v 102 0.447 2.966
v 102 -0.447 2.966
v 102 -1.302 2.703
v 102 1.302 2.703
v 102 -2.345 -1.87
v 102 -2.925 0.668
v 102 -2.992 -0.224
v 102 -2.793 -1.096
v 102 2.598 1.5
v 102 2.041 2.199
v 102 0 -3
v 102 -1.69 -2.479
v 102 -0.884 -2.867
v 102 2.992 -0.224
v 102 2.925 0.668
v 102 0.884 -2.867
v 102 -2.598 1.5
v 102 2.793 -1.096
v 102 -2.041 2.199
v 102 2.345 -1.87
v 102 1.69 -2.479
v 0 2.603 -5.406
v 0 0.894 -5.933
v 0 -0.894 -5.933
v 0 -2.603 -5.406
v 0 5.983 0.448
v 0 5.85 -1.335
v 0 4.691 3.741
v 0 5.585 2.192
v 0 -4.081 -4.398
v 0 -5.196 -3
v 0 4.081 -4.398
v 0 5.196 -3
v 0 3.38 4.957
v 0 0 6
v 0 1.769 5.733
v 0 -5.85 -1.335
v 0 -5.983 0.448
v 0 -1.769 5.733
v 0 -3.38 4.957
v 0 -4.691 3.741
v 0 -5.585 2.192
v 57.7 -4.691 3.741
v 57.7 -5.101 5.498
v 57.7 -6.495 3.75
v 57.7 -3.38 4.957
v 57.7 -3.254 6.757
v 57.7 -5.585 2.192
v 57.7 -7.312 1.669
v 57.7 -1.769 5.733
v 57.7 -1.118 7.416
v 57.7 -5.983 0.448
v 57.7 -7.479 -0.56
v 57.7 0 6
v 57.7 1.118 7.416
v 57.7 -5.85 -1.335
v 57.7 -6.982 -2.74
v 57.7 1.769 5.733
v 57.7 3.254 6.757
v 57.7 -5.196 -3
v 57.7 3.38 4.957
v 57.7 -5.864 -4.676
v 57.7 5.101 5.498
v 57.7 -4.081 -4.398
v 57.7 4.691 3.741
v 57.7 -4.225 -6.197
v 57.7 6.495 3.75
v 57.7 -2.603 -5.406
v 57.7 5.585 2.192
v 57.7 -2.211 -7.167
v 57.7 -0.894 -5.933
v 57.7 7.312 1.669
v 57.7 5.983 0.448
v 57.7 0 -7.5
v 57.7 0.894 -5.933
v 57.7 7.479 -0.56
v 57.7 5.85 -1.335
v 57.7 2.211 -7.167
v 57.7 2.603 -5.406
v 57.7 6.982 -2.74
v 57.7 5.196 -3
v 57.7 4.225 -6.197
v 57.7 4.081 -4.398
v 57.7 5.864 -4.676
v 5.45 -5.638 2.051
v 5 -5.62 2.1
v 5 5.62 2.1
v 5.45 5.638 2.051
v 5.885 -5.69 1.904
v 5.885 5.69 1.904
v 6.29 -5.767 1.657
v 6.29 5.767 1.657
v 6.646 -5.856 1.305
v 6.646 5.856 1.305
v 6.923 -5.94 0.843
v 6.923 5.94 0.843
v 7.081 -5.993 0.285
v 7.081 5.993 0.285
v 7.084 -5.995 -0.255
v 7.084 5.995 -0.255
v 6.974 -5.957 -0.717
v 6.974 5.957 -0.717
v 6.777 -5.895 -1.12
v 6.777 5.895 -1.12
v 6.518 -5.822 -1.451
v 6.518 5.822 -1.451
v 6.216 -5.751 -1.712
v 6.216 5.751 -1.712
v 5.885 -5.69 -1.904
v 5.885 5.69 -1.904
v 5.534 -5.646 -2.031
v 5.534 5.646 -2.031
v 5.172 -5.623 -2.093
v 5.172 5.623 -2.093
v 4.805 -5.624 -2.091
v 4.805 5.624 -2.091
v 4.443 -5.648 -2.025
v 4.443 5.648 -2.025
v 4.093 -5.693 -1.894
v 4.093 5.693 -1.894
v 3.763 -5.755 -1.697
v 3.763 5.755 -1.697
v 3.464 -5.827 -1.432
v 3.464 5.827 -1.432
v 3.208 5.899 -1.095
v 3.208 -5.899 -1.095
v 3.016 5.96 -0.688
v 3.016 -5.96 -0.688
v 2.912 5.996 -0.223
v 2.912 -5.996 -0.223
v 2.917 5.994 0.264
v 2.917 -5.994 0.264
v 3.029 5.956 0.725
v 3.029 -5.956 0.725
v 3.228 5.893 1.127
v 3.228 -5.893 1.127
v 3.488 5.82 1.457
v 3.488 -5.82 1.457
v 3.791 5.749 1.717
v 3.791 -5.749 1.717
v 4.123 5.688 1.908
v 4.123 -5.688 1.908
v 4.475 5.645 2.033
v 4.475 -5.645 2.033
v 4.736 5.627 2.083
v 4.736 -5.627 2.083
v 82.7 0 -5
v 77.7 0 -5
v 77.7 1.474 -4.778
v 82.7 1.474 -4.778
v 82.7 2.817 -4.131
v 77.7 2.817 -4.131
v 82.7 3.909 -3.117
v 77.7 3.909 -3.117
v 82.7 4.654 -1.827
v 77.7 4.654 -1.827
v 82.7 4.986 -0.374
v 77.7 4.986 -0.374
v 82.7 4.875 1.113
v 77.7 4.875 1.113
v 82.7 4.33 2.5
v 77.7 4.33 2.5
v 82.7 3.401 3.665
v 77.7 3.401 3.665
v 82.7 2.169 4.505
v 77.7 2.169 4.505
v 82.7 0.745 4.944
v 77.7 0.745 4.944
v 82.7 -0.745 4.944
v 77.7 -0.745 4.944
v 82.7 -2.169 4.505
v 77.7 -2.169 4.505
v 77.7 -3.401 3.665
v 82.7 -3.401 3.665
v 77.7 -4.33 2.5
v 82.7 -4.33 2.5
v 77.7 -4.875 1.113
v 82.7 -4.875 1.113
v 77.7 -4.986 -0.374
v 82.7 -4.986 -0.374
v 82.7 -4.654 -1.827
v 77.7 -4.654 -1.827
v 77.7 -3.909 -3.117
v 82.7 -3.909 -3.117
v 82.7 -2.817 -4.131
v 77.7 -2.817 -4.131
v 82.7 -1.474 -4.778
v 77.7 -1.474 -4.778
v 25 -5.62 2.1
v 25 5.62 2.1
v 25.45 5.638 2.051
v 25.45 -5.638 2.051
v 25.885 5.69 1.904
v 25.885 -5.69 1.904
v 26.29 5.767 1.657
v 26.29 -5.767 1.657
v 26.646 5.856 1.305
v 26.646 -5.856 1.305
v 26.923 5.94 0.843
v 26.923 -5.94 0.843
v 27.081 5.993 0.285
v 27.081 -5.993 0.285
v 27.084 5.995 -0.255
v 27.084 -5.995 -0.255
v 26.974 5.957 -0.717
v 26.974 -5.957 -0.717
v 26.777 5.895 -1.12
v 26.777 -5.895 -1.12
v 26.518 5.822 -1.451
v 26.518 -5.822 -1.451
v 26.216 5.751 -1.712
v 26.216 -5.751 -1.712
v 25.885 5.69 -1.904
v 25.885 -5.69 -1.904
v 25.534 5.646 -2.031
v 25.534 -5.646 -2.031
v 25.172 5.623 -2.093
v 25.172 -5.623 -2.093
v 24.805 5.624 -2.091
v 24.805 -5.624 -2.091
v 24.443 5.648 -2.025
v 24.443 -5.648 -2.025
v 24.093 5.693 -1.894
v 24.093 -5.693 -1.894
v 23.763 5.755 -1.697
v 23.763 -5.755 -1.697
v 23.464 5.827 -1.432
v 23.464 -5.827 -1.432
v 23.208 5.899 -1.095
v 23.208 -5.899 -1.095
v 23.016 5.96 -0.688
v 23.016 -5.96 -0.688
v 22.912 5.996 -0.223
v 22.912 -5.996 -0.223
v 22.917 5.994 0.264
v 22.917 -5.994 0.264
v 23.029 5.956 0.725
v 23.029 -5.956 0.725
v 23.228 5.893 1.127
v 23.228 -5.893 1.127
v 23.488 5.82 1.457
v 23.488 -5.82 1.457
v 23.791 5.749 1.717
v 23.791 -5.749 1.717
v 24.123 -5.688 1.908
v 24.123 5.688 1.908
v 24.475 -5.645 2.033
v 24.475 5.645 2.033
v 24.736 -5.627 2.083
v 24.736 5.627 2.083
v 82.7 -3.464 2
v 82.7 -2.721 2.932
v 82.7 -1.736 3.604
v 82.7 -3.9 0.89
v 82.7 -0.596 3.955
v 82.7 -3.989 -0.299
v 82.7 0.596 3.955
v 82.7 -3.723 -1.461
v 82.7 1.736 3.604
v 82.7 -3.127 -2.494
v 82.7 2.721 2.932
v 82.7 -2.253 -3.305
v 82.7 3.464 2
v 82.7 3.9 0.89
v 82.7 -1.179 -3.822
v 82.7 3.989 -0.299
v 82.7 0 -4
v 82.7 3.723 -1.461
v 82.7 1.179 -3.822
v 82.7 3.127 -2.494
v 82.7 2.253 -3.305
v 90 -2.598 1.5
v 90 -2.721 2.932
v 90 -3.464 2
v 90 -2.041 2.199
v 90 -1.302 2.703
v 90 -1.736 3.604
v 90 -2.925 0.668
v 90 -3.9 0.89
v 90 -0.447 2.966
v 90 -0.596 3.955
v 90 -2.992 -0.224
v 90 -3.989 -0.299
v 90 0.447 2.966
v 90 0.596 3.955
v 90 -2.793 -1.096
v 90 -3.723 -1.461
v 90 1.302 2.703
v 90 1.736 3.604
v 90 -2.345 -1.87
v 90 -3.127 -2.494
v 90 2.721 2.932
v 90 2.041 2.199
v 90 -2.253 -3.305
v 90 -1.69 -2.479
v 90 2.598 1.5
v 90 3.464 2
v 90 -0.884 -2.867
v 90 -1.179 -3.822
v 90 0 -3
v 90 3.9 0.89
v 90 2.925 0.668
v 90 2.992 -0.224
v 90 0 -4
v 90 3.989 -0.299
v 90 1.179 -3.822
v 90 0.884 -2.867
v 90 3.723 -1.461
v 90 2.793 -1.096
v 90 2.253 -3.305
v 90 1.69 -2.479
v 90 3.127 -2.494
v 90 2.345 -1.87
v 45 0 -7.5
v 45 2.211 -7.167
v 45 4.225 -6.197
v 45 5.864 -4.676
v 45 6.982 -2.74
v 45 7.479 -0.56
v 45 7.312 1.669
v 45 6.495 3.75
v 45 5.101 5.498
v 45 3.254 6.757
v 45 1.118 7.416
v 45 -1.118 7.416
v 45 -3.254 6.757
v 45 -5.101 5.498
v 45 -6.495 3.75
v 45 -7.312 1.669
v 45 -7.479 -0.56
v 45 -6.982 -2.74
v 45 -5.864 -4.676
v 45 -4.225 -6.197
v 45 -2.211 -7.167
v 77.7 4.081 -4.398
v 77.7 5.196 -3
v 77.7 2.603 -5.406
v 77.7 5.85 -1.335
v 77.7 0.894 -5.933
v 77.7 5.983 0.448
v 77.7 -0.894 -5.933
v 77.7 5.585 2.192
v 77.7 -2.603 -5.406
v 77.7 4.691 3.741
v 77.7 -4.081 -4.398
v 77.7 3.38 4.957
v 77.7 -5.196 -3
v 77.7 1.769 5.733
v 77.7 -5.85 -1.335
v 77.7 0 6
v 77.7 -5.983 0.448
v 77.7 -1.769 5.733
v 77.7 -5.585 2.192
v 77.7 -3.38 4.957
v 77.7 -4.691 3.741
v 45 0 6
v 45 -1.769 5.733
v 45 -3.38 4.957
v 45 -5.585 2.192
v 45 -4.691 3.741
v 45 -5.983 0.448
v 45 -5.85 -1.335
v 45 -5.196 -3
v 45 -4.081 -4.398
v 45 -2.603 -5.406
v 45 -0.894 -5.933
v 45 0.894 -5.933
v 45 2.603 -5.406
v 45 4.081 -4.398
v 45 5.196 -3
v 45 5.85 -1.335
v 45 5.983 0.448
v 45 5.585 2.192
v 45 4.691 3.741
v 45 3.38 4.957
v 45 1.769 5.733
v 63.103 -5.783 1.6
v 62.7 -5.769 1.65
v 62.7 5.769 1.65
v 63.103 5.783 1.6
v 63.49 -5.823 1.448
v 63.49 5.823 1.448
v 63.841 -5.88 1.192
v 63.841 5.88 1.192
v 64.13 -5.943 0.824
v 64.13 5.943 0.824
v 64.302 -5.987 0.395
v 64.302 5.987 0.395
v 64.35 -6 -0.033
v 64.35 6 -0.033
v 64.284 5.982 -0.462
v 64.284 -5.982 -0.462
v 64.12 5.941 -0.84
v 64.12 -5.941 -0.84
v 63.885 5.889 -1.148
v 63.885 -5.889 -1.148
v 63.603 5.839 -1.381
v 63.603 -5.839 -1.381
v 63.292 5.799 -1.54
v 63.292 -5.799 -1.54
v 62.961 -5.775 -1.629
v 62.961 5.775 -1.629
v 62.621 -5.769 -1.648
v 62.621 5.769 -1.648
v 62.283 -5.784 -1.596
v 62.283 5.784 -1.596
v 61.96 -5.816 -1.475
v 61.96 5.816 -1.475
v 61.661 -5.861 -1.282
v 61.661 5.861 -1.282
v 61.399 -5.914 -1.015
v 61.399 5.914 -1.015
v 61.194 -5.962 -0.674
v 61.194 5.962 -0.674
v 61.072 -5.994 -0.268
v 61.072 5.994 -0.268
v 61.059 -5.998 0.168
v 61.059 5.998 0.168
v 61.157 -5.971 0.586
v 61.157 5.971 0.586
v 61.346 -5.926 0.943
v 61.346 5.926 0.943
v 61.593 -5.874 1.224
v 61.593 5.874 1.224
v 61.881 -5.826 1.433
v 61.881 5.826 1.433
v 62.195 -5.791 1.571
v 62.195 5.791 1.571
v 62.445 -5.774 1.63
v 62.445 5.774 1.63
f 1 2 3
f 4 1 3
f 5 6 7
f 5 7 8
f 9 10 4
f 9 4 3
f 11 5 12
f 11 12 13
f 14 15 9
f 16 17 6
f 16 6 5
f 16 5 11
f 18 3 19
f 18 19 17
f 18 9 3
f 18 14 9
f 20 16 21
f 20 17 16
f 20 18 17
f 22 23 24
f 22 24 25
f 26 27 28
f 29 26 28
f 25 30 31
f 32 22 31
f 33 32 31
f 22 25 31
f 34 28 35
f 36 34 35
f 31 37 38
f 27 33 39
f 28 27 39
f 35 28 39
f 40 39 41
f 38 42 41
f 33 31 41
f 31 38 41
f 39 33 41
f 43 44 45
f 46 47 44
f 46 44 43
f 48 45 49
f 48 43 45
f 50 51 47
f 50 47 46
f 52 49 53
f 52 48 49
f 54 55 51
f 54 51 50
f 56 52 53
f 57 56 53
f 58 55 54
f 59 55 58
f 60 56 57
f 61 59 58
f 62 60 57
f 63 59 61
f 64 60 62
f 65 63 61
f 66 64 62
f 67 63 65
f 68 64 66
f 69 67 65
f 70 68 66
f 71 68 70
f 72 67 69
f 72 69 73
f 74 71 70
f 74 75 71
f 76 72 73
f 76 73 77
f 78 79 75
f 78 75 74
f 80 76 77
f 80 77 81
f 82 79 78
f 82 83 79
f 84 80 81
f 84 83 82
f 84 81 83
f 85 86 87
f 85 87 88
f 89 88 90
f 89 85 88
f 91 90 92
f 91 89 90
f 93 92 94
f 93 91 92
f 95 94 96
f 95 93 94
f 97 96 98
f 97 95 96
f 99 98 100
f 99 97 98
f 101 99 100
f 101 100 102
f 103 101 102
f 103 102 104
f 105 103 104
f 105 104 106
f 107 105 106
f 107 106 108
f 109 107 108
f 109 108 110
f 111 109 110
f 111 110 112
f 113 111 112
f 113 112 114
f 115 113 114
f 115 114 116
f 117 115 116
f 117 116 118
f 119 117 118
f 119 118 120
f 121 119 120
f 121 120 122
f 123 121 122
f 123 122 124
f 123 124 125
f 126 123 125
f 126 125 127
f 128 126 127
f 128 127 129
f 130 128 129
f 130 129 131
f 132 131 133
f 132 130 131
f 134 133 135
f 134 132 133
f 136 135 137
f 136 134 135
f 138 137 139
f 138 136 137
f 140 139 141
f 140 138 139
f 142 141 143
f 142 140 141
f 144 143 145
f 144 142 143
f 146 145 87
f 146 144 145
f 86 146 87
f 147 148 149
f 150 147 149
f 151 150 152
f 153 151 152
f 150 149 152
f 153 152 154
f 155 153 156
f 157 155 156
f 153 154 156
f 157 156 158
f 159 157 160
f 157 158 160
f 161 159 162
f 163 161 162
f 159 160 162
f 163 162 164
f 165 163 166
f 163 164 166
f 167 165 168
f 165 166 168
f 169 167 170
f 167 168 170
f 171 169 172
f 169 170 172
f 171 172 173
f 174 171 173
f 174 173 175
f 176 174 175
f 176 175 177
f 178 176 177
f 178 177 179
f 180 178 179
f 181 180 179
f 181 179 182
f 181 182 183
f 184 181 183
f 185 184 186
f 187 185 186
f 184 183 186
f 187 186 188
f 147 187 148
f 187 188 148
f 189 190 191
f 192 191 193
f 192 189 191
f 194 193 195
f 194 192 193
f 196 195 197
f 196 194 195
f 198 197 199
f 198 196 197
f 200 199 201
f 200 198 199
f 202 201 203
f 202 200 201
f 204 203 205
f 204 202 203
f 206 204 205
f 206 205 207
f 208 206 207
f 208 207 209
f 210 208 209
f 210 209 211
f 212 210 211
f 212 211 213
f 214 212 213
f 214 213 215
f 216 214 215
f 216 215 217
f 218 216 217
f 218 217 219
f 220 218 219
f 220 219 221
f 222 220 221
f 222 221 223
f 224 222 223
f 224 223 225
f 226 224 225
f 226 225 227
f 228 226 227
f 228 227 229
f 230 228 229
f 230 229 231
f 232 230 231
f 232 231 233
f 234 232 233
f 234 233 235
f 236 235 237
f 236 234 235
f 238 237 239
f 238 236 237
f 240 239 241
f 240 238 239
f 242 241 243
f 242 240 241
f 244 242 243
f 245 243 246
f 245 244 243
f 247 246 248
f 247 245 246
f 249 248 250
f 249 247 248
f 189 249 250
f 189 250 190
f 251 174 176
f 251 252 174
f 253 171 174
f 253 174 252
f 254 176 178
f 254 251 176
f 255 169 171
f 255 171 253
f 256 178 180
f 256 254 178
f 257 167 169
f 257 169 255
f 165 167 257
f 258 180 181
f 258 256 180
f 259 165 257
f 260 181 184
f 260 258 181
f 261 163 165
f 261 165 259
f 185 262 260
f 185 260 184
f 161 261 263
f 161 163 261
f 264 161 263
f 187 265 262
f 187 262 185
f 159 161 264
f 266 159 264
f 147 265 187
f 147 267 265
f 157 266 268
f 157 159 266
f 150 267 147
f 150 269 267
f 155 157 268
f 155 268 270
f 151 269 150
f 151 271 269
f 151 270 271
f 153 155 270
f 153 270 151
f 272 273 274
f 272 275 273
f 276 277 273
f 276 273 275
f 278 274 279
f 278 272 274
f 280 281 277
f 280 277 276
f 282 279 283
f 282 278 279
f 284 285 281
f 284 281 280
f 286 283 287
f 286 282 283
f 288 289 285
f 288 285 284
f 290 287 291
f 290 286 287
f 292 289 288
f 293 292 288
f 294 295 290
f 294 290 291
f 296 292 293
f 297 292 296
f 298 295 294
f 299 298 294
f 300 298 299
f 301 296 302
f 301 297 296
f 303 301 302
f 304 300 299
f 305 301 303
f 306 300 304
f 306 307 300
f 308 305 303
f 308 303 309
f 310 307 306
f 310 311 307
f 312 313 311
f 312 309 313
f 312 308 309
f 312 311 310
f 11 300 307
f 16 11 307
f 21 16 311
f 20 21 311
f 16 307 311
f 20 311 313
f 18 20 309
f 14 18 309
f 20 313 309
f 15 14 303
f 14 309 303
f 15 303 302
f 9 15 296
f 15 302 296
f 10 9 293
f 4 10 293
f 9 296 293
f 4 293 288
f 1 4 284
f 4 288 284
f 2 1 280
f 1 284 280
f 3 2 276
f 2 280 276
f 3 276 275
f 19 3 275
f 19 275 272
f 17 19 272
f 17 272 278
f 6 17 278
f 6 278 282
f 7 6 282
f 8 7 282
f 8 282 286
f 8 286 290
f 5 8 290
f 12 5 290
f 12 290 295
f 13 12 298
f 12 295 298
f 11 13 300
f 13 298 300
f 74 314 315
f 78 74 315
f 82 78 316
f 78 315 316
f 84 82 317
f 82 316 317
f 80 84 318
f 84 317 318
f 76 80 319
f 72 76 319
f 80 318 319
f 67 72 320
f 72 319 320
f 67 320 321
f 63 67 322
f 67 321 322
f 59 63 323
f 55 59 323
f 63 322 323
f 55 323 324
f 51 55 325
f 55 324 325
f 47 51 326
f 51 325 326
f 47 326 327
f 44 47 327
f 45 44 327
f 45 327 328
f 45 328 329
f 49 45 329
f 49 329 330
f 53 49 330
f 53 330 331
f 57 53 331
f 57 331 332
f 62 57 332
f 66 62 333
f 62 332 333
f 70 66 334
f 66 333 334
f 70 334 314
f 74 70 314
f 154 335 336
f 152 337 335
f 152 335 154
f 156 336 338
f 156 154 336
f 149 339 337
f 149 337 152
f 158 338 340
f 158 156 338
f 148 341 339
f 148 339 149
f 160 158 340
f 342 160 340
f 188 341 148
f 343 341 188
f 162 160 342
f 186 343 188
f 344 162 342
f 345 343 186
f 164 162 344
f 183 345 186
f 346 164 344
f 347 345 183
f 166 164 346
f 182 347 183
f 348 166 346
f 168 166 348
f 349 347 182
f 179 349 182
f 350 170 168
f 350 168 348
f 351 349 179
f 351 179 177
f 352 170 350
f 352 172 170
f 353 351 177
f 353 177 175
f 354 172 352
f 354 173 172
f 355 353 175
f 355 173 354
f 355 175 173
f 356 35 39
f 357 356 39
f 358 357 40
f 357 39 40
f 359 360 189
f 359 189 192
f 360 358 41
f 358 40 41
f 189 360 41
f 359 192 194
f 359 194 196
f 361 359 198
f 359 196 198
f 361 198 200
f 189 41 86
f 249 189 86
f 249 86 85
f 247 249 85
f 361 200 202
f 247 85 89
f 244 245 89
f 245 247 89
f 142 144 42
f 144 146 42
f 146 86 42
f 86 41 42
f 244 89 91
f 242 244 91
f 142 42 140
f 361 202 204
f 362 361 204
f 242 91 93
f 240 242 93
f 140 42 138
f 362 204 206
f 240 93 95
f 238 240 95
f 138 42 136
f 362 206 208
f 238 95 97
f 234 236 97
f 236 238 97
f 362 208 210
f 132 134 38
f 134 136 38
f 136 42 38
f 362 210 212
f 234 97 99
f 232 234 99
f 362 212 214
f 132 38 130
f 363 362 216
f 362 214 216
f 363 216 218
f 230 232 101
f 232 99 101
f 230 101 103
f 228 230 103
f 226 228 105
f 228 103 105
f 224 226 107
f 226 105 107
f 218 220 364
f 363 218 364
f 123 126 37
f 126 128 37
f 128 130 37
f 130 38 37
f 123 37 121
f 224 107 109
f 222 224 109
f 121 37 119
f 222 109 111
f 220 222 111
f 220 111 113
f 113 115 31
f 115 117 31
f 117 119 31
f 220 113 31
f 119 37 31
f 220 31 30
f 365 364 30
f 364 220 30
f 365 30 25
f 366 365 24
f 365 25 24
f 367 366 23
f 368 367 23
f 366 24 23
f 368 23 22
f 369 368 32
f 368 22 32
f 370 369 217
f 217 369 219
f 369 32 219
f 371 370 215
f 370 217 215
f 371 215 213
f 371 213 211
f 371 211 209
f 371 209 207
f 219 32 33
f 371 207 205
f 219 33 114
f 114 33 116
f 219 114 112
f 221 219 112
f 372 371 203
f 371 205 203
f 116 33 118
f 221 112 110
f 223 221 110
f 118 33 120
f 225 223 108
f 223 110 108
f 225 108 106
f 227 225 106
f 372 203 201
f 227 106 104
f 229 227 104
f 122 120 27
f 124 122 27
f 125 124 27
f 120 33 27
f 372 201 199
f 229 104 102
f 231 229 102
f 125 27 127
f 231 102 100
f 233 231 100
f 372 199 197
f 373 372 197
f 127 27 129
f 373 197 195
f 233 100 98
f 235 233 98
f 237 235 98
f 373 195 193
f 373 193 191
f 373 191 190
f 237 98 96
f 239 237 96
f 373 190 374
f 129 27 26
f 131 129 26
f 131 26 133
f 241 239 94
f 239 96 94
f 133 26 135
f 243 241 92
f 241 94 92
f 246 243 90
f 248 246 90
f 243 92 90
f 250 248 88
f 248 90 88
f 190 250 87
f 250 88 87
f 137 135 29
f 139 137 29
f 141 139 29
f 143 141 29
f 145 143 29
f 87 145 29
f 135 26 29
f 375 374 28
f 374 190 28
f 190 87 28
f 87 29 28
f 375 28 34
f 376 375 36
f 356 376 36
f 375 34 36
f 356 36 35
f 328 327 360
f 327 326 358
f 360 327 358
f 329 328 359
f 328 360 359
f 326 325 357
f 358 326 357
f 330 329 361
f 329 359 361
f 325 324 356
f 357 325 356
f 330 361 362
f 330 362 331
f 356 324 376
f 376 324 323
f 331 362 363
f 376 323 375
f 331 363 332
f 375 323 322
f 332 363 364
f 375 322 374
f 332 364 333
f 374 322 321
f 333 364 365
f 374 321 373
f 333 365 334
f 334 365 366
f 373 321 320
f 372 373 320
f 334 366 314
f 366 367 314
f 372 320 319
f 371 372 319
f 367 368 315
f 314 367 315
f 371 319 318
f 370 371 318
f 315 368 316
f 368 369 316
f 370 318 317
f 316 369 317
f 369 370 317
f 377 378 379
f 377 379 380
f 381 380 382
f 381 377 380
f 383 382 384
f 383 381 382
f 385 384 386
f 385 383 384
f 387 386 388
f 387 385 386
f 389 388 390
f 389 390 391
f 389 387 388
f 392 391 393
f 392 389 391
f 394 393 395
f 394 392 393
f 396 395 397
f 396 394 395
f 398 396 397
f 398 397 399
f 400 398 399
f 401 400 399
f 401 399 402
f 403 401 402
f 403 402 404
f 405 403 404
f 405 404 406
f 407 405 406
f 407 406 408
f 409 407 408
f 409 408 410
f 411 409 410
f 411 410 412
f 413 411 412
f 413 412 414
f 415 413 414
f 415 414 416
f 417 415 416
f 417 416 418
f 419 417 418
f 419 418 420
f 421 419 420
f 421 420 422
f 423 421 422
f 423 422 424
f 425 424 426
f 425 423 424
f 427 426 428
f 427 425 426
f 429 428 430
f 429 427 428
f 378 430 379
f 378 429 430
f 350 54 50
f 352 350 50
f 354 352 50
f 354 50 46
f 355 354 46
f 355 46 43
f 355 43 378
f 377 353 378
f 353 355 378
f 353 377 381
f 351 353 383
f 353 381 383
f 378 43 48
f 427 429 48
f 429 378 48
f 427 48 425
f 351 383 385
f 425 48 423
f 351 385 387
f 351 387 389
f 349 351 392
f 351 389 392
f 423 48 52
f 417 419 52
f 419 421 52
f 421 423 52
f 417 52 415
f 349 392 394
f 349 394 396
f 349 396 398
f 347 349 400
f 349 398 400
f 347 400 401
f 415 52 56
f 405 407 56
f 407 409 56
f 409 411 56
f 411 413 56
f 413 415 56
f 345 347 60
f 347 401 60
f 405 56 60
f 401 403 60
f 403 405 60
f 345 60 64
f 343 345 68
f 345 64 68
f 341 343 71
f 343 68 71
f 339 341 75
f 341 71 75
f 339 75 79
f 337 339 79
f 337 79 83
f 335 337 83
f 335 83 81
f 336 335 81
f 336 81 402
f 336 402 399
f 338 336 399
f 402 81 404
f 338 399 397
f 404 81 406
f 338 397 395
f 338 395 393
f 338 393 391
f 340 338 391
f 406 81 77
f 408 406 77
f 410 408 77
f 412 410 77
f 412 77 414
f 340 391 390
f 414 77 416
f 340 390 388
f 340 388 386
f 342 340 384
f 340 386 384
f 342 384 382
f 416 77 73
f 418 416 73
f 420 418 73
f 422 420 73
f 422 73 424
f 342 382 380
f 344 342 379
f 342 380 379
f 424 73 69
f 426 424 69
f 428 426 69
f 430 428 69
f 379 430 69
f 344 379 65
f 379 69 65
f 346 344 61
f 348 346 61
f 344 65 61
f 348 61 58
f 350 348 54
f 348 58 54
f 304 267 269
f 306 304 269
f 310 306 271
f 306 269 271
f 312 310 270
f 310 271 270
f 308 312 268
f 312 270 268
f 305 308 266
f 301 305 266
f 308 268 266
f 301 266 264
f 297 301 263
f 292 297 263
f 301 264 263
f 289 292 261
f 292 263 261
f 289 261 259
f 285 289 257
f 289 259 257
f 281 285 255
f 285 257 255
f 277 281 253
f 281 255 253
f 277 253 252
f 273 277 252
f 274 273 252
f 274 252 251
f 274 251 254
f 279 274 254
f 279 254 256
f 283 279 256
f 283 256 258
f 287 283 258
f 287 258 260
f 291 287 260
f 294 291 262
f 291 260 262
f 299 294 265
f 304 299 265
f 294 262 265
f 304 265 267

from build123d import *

# Parameters (mm, degrees)
SKETCH_1_R               = 6
EXTRUDE_1_DEPTH          = 45
SKETCH_2_R               = 7.5
EXTRUDE_2_DEPTH          = 12.7
SKETCH_3_R               = 6
EXTRUDE_3_DEPTH          = 20
SKETCH_4_R               = 5
EXTRUDE_4_DEPTH          = 5
SKETCH_5_R               = 4
EXTRUDE_5_DEPTH          = 7.3
SKETCH_6_R               = 3
EXTRUDE_6_DEPTH          = 12
CUT_EXTRUDE_1_DEPTH      = 103.549987811
CUT_EXTRUDE_1_DEPTH_BACK = 103.549987811
SKETCH_7_R               = 2.1
CUT_EXTRUDE_2_DEPTH      = 103.549987811
CUT_EXTRUDE_2_DEPTH_BACK = 103.549987811
SKETCH_8_R               = 1.65


with BuildPart() as part:
    # ｽｹｯﾁ1 → ﾎﾞｽ - 押し出し1 (new body)
    with BuildSketch(Plane(origin=(0, 0, 0), x_dir=(0, 0, -1), z_dir=(1, 0, 0))):
        with Locations(Location((0, 0, 0), (0, 0, 180))):
            Circle(SKETCH_1_R)
    extrude(amount=EXTRUDE_1_DEPTH)

    # ｽｹｯﾁ2 → ﾎﾞｽ - 押し出し2 (add)
    with BuildSketch(Plane(origin=(45, 0, 0), x_dir=(0, 0, -1), z_dir=(1, 0, 0))):
        Circle(SKETCH_2_R)
    extrude(amount=EXTRUDE_2_DEPTH)

    # ｽｹｯﾁ3 → ﾎﾞｽ - 押し出し3 (add)
    with BuildSketch(Plane(origin=(57.7, 0, 0), x_dir=(0, 0, -1), z_dir=(1, 0, 0))):
        with Locations(Location((0, 0, 0), (0, 0, 180))):
            Circle(SKETCH_3_R)
    extrude(amount=EXTRUDE_3_DEPTH)

    # ｽｹｯﾁ4 → ﾎﾞｽ - 押し出し4 (add)
    with BuildSketch(Plane(origin=(77.7, 0, 0), x_dir=(0, 0, -1), z_dir=(1, 0, 0))):
        Circle(SKETCH_4_R)
    extrude(amount=EXTRUDE_4_DEPTH)

    # ｽｹｯﾁ5 → ﾎﾞｽ - 押し出し5 (add)
    with BuildSketch(Plane(origin=(82.7, 0, 0), x_dir=(0, 0, -1), z_dir=(1, 0, 0))):
        Circle(SKETCH_5_R)
    extrude(amount=EXTRUDE_5_DEPTH)

    # ｽｹｯﾁ6 → ﾎﾞｽ - 押し出し6 (add)
    with BuildSketch(Plane(origin=(90, 0, 0), x_dir=(0, 0, -1), z_dir=(1, 0, 0))):
        Circle(SKETCH_6_R)
    extrude(amount=EXTRUDE_6_DEPTH)

    # ｽｹｯﾁ7 → ｶｯﾄ - 押し出し1 (cut, two sides: drawn at the far end of the back side and taken through both)
    with BuildSketch(Plane(origin=(0, 0, 0), x_dir=(1, 0, 0), z_dir=(0, 1, 0)).offset(-CUT_EXTRUDE_1_DEPTH_BACK)):
        with Locations(Location((25, 0, 0), (0, 0, 270))):
            Circle(SKETCH_7_R)
        with Locations(Location((5, 0, 0), (0, 0, 270))):
            Circle(SKETCH_7_R)
    extrude(amount=CUT_EXTRUDE_1_DEPTH + CUT_EXTRUDE_1_DEPTH_BACK, mode=Mode.SUBTRACT)

    # ｽｹｯﾁ8 → ｶｯﾄ - 押し出し2 (cut, two sides: drawn at the far end of the back side and taken through both)
    with BuildSketch(Plane(origin=(0, 0, 0), x_dir=(1, 0, 0), z_dir=(0, 1, 0)).offset(-CUT_EXTRUDE_2_DEPTH_BACK)):
        with Locations(Location((62.7, 0, 0), (0, 0, 270))):
            Circle(SKETCH_8_R)
    extrude(amount=CUT_EXTRUDE_2_DEPTH + CUT_EXTRUDE_2_DEPTH_BACK, mode=Mode.SUBTRACT)


solid = part.part
